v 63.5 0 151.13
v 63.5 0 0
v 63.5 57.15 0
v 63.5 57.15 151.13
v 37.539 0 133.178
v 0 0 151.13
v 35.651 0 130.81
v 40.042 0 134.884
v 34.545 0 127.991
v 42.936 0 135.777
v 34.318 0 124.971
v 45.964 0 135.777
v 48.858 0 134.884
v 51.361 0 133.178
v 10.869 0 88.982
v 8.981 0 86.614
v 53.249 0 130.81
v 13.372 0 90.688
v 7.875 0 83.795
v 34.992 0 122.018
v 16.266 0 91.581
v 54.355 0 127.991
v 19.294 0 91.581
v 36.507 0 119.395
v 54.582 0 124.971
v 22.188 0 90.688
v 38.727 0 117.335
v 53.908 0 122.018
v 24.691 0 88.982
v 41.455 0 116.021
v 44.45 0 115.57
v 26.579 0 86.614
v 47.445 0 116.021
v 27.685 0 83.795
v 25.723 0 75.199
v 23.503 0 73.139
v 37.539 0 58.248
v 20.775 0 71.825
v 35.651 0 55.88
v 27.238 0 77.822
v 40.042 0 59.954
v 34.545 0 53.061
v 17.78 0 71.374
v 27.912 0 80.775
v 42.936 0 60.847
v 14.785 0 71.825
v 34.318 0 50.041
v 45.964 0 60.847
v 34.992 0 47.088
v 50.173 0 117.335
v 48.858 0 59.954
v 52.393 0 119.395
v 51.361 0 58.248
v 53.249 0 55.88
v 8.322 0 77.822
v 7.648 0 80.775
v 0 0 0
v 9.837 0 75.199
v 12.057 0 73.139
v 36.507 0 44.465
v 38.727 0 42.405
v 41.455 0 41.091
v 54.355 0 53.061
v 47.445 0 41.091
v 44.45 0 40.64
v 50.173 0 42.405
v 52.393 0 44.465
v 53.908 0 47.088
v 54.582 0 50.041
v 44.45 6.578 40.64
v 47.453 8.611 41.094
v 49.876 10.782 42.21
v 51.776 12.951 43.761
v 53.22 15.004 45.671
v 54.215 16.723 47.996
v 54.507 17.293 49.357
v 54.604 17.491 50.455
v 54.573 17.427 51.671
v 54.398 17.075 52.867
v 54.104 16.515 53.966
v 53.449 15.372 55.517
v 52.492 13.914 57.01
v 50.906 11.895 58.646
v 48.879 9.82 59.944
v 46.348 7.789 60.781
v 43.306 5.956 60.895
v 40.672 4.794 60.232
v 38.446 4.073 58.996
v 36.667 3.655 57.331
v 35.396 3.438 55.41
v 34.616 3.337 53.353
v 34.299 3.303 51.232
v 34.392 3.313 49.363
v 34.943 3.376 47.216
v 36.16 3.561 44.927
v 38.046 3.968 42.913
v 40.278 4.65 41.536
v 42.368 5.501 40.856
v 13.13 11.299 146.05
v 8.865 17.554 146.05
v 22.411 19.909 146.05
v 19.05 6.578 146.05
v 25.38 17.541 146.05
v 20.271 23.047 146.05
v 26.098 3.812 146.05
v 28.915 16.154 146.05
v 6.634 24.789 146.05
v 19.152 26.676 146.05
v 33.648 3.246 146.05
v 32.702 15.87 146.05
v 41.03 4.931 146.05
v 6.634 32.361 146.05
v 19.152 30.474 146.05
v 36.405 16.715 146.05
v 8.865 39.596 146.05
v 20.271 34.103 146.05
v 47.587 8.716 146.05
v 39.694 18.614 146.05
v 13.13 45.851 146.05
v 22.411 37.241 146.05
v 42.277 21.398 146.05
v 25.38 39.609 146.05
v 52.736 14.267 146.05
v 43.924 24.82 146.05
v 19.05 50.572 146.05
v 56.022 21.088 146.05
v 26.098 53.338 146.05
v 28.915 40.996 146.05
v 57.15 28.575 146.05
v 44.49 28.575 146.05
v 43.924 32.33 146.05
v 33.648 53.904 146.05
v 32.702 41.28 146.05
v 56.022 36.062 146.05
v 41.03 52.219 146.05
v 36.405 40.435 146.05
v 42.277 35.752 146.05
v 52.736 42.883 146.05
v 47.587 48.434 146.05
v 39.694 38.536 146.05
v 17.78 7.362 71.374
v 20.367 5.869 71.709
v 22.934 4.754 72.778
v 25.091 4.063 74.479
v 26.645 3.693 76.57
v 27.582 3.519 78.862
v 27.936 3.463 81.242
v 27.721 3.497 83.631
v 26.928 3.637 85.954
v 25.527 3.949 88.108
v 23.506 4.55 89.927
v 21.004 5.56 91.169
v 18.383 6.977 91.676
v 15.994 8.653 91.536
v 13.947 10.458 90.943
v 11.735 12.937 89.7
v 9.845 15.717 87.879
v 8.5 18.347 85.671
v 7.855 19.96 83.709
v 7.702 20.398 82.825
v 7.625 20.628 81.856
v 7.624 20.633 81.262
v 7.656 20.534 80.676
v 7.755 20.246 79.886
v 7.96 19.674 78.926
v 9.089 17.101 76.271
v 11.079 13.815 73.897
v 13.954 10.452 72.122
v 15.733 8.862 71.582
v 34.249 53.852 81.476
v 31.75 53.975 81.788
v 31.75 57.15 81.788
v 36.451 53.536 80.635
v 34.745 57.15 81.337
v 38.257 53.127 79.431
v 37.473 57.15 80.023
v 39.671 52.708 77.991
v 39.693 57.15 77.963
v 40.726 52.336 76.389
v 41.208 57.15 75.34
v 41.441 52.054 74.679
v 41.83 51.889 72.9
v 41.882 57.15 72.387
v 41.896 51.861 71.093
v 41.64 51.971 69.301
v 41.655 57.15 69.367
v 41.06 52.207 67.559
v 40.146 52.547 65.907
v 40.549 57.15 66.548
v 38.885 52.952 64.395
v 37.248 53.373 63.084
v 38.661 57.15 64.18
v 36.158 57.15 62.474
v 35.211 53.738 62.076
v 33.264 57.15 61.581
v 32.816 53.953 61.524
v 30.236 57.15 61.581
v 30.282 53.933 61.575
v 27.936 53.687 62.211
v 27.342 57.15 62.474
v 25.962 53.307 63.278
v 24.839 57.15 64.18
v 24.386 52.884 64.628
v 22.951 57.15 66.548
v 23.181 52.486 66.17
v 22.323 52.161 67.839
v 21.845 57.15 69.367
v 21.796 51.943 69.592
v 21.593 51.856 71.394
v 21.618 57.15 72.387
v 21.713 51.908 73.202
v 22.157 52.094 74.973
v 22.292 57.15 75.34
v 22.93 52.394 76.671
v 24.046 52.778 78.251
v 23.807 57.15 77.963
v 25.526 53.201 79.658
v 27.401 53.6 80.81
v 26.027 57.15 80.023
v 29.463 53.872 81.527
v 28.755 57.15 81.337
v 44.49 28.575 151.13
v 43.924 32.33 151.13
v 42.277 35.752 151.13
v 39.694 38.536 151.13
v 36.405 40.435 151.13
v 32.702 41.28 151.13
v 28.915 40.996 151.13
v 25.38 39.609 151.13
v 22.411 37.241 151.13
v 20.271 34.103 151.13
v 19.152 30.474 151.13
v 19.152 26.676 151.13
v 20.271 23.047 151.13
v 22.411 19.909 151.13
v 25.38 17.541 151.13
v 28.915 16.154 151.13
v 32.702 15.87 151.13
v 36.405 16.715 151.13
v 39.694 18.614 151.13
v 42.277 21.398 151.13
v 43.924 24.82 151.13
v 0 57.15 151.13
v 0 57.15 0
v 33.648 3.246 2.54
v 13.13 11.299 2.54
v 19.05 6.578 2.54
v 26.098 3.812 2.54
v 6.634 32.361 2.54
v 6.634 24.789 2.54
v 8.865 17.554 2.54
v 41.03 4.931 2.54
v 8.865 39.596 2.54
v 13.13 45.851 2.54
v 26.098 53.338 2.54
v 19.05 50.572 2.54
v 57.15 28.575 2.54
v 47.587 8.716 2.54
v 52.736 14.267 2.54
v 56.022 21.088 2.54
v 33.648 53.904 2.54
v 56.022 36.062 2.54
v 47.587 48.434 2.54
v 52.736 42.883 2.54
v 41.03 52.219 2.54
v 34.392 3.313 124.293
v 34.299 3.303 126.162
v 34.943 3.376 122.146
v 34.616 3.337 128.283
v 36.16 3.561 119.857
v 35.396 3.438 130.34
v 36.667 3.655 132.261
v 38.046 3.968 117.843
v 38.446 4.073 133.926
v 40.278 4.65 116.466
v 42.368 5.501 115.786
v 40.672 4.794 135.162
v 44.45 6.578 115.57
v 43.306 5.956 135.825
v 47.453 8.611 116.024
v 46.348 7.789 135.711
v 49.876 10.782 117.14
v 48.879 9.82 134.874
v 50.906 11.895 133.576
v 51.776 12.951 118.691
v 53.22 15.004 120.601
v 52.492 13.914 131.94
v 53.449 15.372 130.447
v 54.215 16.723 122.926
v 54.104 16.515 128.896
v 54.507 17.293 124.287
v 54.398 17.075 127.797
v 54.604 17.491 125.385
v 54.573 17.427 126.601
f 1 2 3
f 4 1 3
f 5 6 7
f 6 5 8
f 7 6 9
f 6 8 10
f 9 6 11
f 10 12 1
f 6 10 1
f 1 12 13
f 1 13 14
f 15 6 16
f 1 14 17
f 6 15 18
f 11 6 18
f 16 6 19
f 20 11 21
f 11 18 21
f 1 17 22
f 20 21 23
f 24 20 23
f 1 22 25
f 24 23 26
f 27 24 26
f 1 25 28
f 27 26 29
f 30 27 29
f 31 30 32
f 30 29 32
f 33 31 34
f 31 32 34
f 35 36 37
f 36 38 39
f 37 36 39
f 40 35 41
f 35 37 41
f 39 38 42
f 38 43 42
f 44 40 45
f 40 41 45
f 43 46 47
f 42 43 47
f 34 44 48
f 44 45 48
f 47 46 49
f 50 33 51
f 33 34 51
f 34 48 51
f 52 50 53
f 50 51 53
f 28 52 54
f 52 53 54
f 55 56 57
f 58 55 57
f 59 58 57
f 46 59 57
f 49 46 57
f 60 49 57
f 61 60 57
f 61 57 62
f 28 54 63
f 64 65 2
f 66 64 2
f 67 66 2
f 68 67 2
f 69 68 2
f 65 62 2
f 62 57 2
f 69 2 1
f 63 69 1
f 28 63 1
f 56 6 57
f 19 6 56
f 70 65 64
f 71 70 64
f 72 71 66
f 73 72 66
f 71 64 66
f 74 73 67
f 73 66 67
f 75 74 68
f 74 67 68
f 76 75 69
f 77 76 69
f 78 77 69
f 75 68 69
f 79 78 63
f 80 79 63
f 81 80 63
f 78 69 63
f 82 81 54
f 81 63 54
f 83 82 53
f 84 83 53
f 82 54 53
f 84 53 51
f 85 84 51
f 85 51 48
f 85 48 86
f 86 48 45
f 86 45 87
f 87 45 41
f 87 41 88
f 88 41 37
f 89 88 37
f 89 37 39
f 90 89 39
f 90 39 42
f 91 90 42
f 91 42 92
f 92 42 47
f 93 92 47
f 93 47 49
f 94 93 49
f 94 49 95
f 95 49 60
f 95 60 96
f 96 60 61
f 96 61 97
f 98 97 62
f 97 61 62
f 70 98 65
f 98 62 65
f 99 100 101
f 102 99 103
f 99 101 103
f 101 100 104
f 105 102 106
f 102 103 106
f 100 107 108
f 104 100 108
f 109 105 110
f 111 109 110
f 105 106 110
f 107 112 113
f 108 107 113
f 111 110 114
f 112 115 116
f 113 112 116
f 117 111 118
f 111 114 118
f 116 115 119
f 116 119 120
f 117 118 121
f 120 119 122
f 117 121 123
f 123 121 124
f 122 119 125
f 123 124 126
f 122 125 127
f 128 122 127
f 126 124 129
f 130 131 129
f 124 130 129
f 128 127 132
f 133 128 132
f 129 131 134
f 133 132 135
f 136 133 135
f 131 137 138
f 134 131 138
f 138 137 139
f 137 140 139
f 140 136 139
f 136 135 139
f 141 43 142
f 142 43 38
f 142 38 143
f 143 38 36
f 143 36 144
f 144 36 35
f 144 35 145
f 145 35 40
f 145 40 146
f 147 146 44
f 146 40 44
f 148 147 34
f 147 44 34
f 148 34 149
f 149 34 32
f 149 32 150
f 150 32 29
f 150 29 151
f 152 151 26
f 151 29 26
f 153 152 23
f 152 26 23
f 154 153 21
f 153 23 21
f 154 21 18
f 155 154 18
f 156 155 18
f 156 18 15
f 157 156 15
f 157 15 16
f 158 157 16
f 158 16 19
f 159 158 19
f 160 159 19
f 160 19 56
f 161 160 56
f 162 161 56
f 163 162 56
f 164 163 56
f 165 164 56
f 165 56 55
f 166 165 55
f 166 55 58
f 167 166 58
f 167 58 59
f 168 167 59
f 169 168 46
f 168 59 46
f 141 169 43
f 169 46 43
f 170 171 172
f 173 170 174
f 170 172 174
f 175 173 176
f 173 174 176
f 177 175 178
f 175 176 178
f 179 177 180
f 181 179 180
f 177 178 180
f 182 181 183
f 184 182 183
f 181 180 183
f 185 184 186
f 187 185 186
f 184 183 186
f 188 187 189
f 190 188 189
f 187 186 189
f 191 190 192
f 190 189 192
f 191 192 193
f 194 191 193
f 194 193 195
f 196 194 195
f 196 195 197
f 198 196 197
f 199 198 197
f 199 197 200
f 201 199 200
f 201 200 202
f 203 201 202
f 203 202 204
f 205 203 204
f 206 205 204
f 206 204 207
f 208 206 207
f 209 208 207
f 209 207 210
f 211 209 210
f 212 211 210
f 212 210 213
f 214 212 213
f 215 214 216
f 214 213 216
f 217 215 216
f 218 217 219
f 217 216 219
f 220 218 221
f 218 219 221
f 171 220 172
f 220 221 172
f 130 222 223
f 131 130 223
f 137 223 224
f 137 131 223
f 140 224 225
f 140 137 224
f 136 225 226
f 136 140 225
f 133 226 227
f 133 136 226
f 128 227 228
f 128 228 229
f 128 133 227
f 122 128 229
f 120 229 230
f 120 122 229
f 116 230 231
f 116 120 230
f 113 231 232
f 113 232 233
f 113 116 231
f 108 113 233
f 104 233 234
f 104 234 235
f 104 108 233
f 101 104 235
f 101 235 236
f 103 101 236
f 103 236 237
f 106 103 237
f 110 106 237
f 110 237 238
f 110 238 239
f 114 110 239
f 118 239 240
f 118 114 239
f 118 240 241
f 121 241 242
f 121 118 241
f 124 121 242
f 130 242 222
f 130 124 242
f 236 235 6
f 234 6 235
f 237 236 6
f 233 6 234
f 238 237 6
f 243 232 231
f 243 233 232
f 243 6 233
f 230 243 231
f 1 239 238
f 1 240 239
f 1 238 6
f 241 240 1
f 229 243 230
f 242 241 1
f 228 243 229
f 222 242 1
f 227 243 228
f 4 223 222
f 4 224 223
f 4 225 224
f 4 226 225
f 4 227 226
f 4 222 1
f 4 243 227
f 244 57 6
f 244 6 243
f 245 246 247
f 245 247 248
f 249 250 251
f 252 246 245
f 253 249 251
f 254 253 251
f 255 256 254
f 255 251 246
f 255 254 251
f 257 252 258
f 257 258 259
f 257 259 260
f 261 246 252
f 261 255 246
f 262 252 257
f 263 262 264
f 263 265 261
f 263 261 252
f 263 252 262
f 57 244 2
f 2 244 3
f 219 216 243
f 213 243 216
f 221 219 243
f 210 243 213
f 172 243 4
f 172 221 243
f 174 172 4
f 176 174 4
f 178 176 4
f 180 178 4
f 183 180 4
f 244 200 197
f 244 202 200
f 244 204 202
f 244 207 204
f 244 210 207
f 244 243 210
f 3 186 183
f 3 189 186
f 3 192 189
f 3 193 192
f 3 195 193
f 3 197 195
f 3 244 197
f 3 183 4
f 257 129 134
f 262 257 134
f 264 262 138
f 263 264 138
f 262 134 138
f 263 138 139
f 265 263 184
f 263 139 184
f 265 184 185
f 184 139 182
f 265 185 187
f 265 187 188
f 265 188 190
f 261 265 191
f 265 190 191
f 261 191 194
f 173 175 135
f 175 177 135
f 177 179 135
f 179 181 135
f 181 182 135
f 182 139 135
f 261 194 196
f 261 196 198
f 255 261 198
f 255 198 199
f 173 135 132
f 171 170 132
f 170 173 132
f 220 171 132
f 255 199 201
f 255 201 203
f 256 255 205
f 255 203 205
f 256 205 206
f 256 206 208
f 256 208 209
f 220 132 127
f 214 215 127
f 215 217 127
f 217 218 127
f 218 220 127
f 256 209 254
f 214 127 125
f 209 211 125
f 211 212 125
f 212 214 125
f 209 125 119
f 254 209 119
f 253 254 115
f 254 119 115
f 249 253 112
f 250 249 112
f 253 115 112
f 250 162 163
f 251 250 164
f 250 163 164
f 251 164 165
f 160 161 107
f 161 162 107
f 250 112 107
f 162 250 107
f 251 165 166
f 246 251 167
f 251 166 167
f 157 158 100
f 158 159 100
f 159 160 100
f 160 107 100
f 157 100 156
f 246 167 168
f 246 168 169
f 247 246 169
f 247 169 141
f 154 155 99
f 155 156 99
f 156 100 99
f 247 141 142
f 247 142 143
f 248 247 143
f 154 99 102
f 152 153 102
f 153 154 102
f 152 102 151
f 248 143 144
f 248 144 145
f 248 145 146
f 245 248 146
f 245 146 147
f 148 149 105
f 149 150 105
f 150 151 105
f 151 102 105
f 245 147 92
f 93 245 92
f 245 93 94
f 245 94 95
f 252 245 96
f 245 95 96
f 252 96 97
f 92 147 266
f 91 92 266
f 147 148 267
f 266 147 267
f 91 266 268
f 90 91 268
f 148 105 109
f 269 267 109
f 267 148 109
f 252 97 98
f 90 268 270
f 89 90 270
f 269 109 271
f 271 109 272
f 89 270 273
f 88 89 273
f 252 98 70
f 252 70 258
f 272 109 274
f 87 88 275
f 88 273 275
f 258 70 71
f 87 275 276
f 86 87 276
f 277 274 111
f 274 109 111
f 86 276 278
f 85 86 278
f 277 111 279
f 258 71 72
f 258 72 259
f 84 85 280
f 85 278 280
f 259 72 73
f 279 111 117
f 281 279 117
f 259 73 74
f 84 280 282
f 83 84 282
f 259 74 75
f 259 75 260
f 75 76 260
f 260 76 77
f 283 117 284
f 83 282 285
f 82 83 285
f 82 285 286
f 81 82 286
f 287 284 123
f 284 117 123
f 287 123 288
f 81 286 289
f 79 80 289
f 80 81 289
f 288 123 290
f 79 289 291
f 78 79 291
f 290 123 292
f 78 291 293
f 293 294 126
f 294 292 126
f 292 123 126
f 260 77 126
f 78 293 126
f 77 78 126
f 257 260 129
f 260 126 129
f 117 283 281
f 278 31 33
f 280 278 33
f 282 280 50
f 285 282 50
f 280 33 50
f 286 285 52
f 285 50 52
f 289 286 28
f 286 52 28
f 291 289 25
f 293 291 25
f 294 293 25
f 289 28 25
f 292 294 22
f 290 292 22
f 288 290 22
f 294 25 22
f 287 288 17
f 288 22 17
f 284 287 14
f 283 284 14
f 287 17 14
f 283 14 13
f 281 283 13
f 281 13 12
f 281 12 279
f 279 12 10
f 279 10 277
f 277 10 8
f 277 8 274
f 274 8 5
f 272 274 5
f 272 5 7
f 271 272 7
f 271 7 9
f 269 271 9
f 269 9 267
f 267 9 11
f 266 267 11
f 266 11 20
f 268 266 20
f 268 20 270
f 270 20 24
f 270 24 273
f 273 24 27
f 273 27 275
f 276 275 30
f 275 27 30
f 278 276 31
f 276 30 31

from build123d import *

# Parameters (mm, degrees)
SKETCH1_W               = 63.5
SKETCH1_H               = 57.15
BOSS_EXTRUDE5_DEPTH     = 148.59
SKETCH5_OUTSIDE_W       = 99.78
SKETCH5_OUTSIDE_H       = 93.43
SKETCH5_OUTSIDE_W_2     = 63.5
SKETCH5_OUTSIDE_H_2     = 57.15
SKETCH5_OUTSIDE_R       = 25.4
CUT_EXTRUDE4_DEPTH      = 146.05
SKETCH8_W               = 63.5
SKETCH8_H               = 57.15
SKETCH8_R               = 12.740402439
BOSS_EXTRUDE6_DEPTH     = 2.54
CUT_EXTRUDE5_REACH      = 175.605
CUT_EXTRUDE5_END_RADIUS = 25.4
SKETCH9_R               = 10.16
CUT_EXTRUDE6_REACH      = 175.605
CUT_EXTRUDE6_END_RADIUS = 25.4
SKETCH10_R              = 10.16


with BuildPart() as part:
    # Sketch1 → Boss-Extrude5 (new body)
    with BuildSketch(Plane.XY):
        with Locations((31.75, 28.575)):
            Rectangle(SKETCH1_W, SKETCH1_H)
    extrude(amount=BOSS_EXTRUDE5_DEPTH)

    # Sketch5 outside → Cut-Extrude4 (cut)
    # profile 1 of 2: a face of its own
    with BuildSketch(Plane.XY.offset(148.59)):
        with Locations((31.75, 28.575)):
            Rectangle(SKETCH5_OUTSIDE_W, SKETCH5_OUTSIDE_H)
        with Locations((31.75, 28.575)):
            Rectangle(SKETCH5_OUTSIDE_W_2, SKETCH5_OUTSIDE_H_2, mode=Mode.SUBTRACT)
    # profile 2 of 2: a face of its own
    with BuildSketch(Plane.XY.offset(148.59)):
        with Locations((31.75, 28.575)):
            Circle(SKETCH5_OUTSIDE_R)
    extrude(amount=-CUT_EXTRUDE4_DEPTH, mode=Mode.SUBTRACT)

    # Sketch8 → Boss-Extrude6 (add, symmetric)
    with BuildSketch(Plane.XY.offset(148.59)):
        with Locations((31.75, 28.575)):
            Rectangle(SKETCH8_W, SKETCH8_H)
        with Locations((31.75, 28.575)):
            Circle(SKETCH8_R, mode=Mode.SUBTRACT)
    extrude(amount=BOSS_EXTRUDE6_DEPTH, both=True)

    # Cut-Extrude5: up to this cylinder (the profile starts outside it)
    cut_extrude5_end = Plane(origin=(31.75, 28.575, 71.628), z_dir=(0, 0, 1)) * Cylinder(CUT_EXTRUDE5_END_RADIUS, 403.01, mode=Mode.PRIVATE)
    # Sketch9 → Cut-Extrude5 (cut, up to the surface)
    with BuildSketch(Plane(origin=(0, 57.15, 0), x_dir=(1, 0, 0), z_dir=(0, 1, 0)), mode=Mode.PRIVATE) as cut_extrude5_sk1:
        with Locations(Location((31.75, -71.628, 0), (0, 0, 270))):
            Circle(SKETCH9_R)
    cut_extrude5_tool1 = extrude(cut_extrude5_sk1.sketch, amount=-CUT_EXTRUDE5_REACH, mode=Mode.PRIVATE) - cut_extrude5_end
    add(cut_extrude5_tool1.solids().sort_by_distance((31.75, 57.15, 71.628))[0], mode=Mode.SUBTRACT)

    # Cut-Extrude6: up to this cylinder (the profile starts outside it)
    cut_extrude6_end = Plane(origin=(31.75, 28.575, 88.265), z_dir=(0, 0, 1)) * Cylinder(CUT_EXTRUDE6_END_RADIUS, 477.94, mode=Mode.PRIVATE)
    # Sketch10 → Cut-Extrude6 (cut, up to the surface)
    with BuildSketch(Plane.XZ, mode=Mode.PRIVATE) as cut_extrude6_sk1:
        with Locations(Location((17.78, 81.534, 0), (0, 0, 270))):
            Circle(SKETCH10_R)
    cut_extrude6_tool1 = extrude(cut_extrude6_sk1.sketch, amount=-CUT_EXTRUDE6_REACH, mode=Mode.PRIVATE) - cut_extrude6_end
    add(cut_extrude6_tool1.solids().sort_by_distance((17.78, 0, 81.534))[0], mode=Mode.SUBTRACT)
    # Sketch10 → Cut-Extrude6 (cut, up to the surface)
    with BuildSketch(Plane.XZ, mode=Mode.PRIVATE) as cut_extrude6_sk2:
        with Locations(Location((44.45, 125.73, 0), (0, 0, 270))):
            Circle(SKETCH10_R)
    cut_extrude6_tool2 = extrude(cut_extrude6_sk2.sketch, amount=-CUT_EXTRUDE6_REACH, mode=Mode.PRIVATE) - cut_extrude6_end
    add(cut_extrude6_tool2.solids().sort_by_distance((44.45, 0, 125.73))[0], mode=Mode.SUBTRACT)
    # Sketch10 → Cut-Extrude6 (cut, up to the surface)
    with BuildSketch(Plane.XZ, mode=Mode.PRIVATE) as cut_extrude6_sk3:
        with Locations(Location((44.45, 50.8, 0), (0, 0, 270))):
            Circle(SKETCH10_R)
    cut_extrude6_tool3 = extrude(cut_extrude6_sk3.sketch, amount=-CUT_EXTRUDE6_REACH, mode=Mode.PRIVATE) - cut_extrude6_end
    add(cut_extrude6_tool3.solids().sort_by_distance((44.45, 0, 50.8))[0], mode=Mode.SUBTRACT)


solid = part.part
